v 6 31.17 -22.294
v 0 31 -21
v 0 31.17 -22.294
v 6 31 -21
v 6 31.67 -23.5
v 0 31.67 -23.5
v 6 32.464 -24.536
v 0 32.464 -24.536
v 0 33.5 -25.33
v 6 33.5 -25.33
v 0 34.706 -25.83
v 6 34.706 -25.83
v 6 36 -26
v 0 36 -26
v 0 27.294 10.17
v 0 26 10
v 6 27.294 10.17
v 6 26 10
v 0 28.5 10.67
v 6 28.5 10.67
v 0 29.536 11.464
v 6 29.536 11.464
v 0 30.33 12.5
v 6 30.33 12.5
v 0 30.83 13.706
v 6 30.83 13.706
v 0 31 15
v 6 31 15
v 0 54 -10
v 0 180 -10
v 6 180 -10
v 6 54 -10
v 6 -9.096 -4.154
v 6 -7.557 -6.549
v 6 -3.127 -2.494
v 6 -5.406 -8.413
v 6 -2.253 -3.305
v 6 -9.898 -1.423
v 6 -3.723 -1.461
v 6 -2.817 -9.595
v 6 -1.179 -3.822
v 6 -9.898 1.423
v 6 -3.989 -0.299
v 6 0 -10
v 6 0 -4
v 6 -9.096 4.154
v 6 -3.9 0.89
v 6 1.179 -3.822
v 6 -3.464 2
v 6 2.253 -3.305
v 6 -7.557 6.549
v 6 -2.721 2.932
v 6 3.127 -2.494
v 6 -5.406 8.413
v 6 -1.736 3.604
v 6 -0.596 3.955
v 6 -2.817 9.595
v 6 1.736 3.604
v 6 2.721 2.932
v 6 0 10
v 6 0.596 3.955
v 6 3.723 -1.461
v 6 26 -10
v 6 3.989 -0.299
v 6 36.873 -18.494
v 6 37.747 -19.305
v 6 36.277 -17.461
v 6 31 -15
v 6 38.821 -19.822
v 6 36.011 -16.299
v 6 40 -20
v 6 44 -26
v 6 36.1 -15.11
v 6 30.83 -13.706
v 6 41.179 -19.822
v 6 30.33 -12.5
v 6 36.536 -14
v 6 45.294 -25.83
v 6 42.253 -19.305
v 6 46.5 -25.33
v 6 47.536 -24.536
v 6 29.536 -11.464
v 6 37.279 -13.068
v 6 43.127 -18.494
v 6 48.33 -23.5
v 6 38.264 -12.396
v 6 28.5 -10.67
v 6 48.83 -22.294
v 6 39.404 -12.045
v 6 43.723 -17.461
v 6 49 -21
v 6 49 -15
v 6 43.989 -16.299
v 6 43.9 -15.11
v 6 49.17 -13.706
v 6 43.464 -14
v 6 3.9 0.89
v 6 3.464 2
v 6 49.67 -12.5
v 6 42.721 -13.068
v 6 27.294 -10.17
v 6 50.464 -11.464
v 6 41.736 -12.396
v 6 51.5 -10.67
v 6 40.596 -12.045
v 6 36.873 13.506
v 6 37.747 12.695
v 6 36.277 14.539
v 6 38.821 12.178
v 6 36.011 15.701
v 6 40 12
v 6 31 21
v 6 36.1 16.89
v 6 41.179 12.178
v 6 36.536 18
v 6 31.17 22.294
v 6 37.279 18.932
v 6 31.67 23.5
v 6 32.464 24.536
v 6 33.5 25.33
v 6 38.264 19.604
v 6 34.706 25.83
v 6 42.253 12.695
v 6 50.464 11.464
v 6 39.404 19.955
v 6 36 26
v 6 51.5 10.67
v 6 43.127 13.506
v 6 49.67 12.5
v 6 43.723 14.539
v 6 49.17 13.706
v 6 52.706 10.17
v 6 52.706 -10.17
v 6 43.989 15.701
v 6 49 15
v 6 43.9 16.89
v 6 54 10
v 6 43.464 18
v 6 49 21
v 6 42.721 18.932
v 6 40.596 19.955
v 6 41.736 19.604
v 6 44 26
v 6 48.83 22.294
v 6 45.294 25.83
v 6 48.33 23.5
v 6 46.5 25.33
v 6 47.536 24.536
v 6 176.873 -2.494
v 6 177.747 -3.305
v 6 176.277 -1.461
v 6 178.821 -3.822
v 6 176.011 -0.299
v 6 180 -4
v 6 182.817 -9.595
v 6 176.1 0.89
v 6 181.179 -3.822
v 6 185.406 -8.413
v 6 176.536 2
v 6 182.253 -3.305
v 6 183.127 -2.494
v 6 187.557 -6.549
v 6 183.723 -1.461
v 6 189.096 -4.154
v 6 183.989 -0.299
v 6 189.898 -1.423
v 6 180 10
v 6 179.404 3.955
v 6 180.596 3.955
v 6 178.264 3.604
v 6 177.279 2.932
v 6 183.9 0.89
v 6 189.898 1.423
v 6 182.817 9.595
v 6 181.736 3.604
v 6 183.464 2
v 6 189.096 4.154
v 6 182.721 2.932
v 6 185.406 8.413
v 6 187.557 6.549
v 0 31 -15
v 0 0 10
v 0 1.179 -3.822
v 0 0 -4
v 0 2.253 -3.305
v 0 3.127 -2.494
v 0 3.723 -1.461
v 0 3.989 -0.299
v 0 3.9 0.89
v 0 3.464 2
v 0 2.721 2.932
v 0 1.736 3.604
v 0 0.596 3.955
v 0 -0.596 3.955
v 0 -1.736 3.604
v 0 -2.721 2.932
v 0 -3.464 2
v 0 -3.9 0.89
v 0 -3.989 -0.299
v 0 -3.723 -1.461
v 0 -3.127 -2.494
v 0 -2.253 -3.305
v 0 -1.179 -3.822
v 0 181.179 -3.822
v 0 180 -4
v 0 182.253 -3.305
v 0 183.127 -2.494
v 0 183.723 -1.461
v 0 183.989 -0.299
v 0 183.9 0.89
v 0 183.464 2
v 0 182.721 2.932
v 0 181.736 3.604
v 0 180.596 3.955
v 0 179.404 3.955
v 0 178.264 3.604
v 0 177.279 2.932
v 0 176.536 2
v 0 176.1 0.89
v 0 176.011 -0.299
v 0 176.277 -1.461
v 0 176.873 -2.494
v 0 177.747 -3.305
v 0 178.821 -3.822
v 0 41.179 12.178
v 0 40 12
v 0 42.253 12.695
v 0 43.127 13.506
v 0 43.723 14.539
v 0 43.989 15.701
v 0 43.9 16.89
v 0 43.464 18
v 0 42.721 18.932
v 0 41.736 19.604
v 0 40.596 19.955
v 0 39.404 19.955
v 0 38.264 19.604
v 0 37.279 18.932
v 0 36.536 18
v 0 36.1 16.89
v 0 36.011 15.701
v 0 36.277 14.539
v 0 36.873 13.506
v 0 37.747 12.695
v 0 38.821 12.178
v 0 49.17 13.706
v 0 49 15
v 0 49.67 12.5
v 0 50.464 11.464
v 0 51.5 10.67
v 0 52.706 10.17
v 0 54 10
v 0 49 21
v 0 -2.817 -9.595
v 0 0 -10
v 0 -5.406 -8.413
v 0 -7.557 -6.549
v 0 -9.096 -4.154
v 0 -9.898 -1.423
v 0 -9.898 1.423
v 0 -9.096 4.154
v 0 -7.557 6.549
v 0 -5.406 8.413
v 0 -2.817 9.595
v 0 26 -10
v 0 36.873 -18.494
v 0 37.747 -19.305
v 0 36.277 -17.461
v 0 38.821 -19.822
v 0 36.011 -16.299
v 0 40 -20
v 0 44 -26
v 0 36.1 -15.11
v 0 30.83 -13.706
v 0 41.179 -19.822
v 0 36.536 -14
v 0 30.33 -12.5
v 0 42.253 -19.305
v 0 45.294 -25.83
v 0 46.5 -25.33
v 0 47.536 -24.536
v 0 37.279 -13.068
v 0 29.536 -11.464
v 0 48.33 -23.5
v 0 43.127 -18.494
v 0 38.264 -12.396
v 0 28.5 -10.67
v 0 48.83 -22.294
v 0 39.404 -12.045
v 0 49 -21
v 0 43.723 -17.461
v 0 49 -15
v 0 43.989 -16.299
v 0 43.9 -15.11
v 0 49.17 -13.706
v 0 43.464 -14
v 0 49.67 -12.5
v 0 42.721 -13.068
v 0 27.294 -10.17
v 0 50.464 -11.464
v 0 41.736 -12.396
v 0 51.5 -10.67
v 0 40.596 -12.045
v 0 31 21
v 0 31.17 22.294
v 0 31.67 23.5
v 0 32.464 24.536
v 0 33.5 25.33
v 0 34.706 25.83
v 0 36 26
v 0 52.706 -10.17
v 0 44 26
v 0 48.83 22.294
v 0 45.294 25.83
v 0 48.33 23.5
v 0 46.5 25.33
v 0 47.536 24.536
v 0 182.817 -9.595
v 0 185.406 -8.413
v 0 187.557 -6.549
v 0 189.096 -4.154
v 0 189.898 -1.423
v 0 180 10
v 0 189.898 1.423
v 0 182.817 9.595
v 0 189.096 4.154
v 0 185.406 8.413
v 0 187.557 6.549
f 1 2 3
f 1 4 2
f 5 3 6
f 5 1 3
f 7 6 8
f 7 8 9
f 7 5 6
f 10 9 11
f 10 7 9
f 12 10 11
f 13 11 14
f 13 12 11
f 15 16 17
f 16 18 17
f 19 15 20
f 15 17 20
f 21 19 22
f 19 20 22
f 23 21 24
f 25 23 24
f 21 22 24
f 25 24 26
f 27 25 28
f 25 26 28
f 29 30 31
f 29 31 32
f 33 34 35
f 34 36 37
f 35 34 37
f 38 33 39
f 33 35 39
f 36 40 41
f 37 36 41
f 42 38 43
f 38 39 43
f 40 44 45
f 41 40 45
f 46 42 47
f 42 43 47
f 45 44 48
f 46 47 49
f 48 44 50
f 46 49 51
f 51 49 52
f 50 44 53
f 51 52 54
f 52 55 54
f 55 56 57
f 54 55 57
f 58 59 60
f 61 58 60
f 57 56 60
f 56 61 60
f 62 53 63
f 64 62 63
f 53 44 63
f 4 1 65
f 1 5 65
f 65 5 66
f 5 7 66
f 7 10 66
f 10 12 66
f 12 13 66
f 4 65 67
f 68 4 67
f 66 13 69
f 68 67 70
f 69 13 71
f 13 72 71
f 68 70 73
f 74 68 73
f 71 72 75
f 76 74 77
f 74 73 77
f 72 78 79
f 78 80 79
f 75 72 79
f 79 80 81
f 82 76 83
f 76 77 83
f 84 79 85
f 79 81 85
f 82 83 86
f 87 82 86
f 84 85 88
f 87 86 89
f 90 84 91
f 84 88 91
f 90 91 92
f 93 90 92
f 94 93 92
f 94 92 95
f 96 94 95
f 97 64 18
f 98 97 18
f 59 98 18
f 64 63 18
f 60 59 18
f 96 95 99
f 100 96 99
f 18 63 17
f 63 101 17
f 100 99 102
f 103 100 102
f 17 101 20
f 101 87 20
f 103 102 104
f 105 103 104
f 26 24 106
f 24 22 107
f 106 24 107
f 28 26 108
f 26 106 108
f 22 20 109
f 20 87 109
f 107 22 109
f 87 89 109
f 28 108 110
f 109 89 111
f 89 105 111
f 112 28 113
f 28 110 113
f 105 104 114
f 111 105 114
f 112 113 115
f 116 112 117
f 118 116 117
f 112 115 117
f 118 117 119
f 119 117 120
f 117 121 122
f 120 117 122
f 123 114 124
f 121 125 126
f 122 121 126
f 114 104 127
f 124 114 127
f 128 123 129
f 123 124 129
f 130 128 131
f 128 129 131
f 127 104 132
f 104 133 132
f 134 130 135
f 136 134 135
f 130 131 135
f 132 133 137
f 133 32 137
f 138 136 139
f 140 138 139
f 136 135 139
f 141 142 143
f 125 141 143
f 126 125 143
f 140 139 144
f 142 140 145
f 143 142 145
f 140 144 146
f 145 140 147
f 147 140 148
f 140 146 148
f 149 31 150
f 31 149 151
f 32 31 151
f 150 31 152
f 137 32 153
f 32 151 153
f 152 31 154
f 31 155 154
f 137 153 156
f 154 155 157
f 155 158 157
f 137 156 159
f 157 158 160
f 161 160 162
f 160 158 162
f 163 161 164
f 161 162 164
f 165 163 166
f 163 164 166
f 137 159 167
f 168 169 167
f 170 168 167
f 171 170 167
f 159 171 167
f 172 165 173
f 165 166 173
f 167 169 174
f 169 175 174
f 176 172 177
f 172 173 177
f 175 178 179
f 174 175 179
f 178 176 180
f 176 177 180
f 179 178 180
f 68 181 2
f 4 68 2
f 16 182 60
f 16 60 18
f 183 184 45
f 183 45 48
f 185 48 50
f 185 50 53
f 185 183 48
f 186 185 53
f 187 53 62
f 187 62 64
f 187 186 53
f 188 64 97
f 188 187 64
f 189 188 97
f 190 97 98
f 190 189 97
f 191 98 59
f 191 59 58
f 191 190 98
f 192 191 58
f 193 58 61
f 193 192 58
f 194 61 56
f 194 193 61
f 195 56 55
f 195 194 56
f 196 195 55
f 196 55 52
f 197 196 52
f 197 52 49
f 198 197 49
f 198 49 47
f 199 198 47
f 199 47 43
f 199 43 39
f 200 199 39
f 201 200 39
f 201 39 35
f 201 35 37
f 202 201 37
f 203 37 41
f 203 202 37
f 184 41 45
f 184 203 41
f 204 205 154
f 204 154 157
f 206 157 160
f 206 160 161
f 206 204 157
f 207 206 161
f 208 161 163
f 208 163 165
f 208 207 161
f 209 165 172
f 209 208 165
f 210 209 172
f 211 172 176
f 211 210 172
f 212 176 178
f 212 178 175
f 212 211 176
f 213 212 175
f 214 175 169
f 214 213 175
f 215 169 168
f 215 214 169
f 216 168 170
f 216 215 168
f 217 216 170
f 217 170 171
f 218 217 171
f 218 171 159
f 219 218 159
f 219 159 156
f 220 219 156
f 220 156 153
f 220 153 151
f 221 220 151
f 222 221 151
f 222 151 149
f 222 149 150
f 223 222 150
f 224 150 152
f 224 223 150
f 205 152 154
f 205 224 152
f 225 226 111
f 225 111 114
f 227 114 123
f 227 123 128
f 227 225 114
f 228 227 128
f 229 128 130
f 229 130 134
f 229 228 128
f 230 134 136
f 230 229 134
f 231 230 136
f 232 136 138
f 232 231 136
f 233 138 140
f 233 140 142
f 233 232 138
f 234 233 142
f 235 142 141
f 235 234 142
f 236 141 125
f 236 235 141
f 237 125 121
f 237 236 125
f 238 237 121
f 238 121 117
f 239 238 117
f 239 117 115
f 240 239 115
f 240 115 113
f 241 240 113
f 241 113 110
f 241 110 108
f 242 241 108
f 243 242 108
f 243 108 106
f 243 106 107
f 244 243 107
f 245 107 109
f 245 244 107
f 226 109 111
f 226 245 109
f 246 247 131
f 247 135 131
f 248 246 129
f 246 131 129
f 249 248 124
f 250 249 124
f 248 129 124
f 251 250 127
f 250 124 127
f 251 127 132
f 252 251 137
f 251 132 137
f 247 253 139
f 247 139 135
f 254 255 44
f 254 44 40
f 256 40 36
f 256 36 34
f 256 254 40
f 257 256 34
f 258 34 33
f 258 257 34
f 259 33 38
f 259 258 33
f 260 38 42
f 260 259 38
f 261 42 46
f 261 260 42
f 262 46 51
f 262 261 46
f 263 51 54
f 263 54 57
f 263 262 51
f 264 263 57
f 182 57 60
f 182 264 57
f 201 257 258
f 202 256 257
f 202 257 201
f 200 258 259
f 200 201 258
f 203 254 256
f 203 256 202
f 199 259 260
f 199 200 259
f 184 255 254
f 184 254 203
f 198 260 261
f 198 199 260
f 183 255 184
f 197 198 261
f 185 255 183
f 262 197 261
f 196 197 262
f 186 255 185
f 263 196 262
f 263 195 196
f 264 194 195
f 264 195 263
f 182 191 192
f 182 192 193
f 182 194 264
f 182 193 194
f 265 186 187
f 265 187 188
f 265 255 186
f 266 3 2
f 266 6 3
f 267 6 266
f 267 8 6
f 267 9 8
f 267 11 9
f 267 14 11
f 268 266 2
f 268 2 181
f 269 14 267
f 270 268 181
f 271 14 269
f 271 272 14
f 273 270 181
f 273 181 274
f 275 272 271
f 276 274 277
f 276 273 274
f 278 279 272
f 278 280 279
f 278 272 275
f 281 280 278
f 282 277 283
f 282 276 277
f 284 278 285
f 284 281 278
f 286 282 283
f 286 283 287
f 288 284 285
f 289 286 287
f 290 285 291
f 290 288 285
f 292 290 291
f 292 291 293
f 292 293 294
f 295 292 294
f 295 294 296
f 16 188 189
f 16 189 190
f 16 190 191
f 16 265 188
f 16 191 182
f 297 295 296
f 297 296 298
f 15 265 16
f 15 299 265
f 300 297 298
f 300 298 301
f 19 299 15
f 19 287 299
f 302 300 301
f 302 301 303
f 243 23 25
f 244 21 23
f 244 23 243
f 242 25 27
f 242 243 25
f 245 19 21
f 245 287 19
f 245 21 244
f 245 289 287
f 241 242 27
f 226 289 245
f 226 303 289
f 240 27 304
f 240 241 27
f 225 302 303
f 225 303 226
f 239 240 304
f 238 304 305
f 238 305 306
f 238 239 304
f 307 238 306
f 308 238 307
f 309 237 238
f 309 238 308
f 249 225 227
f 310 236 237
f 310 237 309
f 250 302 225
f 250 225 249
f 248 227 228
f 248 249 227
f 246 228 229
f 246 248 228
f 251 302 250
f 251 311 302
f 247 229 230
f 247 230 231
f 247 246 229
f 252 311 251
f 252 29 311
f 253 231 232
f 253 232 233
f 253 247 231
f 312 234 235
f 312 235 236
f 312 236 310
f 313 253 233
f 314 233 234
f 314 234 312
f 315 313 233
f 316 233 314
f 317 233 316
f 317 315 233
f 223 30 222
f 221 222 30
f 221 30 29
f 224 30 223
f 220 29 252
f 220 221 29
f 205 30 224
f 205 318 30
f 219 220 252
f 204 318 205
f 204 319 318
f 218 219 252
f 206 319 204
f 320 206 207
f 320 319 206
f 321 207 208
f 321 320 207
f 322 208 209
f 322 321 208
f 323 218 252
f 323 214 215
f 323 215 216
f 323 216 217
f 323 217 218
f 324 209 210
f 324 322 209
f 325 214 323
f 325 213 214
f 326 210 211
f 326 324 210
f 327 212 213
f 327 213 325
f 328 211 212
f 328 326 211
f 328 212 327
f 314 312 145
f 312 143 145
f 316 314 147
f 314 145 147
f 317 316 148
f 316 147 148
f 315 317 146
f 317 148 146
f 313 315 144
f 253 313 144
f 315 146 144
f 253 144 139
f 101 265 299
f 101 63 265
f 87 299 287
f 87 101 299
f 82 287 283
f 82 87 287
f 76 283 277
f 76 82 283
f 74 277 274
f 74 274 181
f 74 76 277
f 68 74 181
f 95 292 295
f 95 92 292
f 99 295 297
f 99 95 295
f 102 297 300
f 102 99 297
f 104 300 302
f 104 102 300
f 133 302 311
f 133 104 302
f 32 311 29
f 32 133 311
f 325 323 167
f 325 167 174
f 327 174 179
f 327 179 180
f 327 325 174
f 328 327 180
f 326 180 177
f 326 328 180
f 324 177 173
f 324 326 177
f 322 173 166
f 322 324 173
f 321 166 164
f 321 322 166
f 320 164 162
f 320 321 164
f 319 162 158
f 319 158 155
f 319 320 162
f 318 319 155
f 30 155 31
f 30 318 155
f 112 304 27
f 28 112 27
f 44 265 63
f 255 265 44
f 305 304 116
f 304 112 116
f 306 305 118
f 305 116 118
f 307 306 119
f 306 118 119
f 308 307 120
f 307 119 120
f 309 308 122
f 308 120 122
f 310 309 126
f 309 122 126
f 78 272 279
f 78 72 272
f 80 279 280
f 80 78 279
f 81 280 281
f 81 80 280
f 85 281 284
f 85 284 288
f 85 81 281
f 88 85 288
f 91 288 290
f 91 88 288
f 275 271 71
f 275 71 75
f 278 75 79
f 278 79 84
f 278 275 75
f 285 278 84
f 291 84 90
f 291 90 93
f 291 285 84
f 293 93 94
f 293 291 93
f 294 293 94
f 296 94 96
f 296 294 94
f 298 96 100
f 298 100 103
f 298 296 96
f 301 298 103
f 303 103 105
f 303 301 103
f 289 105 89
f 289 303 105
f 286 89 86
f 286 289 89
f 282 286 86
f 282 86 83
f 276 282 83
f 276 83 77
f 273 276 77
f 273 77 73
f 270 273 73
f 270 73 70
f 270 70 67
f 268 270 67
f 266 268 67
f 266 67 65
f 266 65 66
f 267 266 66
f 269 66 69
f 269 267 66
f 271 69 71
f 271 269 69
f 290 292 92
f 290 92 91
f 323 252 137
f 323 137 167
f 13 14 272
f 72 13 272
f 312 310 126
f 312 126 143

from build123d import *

# Parameters (mm, degrees)
SKETCH2_R           = 4
SKETCH2_W           = 52
SKETCH2_H           = 18
BOSS_EXTRUDE1_DEPTH = 6
FILLET1_R           = 5


with BuildPart() as part:
    # Sketch2 → Boss-Extrude1 (new body)
    with BuildSketch(Plane(origin=(0, 0, 0), x_dir=(0, 0, -1), z_dir=(1, 0, 0))):
        with BuildLine():
            Line((-10, 0), (-10, 180))
            ThreePointArc((-10, 180), (0, 190), (10, 180))
            Line((10, 180), (10, 0))
            ThreePointArc((10, 0), (0, -10), (-10, 0))
        make_face()
        Circle(SKETCH2_R, mode=Mode.SUBTRACT)
        with Locations((0, 180)):
            Circle(SKETCH2_R, mode=Mode.SUBTRACT)
        with Locations((0, 40)):
            Rectangle(SKETCH2_W, SKETCH2_H)
        with Locations((-16, 40)):
            Circle(SKETCH2_R, mode=Mode.SUBTRACT)
        with Locations((16, 40)):
            Circle(SKETCH2_R, mode=Mode.SUBTRACT)
    extrude(amount=BOSS_EXTRUDE1_DEPTH)

    # Fillet1
    fillet1_edges = [part.edges().sort_by_distance(p)[0] for p in [
        (3, 49, 10),
        (3, 49, -10),
        (3, 49, -26),
        (3, 31, -26),
        (3, 31, -10),
        (3, 31, 10),
        (3, 31, 26),
        (3, 49, 26),
    ]]
    fillet(fillet1_edges, radius=FILLET1_R)


solid = part.part
